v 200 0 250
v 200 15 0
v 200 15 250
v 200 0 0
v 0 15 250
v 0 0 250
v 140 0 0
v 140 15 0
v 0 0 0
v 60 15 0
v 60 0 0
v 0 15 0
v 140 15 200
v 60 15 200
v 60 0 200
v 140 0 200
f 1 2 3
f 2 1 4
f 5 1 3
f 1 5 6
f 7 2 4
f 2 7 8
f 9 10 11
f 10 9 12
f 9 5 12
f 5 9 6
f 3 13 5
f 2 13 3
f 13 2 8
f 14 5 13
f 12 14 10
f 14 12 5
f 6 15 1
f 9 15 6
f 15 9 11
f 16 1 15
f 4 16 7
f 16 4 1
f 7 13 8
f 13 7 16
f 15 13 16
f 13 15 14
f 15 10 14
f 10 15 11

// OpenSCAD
// Architectural: Wall panel with door cutout

module wall_panel(width=200, height=250, thickness=15, 
                  door_width=80, door_height=200) {
    difference() {
        cube([width, thickness, height]);
        // Door cutout
        translate([(width-door_width)/2, -1, 0])
            cube([door_width, thickness+2, door_height]);
    }
}

wall_panel();
